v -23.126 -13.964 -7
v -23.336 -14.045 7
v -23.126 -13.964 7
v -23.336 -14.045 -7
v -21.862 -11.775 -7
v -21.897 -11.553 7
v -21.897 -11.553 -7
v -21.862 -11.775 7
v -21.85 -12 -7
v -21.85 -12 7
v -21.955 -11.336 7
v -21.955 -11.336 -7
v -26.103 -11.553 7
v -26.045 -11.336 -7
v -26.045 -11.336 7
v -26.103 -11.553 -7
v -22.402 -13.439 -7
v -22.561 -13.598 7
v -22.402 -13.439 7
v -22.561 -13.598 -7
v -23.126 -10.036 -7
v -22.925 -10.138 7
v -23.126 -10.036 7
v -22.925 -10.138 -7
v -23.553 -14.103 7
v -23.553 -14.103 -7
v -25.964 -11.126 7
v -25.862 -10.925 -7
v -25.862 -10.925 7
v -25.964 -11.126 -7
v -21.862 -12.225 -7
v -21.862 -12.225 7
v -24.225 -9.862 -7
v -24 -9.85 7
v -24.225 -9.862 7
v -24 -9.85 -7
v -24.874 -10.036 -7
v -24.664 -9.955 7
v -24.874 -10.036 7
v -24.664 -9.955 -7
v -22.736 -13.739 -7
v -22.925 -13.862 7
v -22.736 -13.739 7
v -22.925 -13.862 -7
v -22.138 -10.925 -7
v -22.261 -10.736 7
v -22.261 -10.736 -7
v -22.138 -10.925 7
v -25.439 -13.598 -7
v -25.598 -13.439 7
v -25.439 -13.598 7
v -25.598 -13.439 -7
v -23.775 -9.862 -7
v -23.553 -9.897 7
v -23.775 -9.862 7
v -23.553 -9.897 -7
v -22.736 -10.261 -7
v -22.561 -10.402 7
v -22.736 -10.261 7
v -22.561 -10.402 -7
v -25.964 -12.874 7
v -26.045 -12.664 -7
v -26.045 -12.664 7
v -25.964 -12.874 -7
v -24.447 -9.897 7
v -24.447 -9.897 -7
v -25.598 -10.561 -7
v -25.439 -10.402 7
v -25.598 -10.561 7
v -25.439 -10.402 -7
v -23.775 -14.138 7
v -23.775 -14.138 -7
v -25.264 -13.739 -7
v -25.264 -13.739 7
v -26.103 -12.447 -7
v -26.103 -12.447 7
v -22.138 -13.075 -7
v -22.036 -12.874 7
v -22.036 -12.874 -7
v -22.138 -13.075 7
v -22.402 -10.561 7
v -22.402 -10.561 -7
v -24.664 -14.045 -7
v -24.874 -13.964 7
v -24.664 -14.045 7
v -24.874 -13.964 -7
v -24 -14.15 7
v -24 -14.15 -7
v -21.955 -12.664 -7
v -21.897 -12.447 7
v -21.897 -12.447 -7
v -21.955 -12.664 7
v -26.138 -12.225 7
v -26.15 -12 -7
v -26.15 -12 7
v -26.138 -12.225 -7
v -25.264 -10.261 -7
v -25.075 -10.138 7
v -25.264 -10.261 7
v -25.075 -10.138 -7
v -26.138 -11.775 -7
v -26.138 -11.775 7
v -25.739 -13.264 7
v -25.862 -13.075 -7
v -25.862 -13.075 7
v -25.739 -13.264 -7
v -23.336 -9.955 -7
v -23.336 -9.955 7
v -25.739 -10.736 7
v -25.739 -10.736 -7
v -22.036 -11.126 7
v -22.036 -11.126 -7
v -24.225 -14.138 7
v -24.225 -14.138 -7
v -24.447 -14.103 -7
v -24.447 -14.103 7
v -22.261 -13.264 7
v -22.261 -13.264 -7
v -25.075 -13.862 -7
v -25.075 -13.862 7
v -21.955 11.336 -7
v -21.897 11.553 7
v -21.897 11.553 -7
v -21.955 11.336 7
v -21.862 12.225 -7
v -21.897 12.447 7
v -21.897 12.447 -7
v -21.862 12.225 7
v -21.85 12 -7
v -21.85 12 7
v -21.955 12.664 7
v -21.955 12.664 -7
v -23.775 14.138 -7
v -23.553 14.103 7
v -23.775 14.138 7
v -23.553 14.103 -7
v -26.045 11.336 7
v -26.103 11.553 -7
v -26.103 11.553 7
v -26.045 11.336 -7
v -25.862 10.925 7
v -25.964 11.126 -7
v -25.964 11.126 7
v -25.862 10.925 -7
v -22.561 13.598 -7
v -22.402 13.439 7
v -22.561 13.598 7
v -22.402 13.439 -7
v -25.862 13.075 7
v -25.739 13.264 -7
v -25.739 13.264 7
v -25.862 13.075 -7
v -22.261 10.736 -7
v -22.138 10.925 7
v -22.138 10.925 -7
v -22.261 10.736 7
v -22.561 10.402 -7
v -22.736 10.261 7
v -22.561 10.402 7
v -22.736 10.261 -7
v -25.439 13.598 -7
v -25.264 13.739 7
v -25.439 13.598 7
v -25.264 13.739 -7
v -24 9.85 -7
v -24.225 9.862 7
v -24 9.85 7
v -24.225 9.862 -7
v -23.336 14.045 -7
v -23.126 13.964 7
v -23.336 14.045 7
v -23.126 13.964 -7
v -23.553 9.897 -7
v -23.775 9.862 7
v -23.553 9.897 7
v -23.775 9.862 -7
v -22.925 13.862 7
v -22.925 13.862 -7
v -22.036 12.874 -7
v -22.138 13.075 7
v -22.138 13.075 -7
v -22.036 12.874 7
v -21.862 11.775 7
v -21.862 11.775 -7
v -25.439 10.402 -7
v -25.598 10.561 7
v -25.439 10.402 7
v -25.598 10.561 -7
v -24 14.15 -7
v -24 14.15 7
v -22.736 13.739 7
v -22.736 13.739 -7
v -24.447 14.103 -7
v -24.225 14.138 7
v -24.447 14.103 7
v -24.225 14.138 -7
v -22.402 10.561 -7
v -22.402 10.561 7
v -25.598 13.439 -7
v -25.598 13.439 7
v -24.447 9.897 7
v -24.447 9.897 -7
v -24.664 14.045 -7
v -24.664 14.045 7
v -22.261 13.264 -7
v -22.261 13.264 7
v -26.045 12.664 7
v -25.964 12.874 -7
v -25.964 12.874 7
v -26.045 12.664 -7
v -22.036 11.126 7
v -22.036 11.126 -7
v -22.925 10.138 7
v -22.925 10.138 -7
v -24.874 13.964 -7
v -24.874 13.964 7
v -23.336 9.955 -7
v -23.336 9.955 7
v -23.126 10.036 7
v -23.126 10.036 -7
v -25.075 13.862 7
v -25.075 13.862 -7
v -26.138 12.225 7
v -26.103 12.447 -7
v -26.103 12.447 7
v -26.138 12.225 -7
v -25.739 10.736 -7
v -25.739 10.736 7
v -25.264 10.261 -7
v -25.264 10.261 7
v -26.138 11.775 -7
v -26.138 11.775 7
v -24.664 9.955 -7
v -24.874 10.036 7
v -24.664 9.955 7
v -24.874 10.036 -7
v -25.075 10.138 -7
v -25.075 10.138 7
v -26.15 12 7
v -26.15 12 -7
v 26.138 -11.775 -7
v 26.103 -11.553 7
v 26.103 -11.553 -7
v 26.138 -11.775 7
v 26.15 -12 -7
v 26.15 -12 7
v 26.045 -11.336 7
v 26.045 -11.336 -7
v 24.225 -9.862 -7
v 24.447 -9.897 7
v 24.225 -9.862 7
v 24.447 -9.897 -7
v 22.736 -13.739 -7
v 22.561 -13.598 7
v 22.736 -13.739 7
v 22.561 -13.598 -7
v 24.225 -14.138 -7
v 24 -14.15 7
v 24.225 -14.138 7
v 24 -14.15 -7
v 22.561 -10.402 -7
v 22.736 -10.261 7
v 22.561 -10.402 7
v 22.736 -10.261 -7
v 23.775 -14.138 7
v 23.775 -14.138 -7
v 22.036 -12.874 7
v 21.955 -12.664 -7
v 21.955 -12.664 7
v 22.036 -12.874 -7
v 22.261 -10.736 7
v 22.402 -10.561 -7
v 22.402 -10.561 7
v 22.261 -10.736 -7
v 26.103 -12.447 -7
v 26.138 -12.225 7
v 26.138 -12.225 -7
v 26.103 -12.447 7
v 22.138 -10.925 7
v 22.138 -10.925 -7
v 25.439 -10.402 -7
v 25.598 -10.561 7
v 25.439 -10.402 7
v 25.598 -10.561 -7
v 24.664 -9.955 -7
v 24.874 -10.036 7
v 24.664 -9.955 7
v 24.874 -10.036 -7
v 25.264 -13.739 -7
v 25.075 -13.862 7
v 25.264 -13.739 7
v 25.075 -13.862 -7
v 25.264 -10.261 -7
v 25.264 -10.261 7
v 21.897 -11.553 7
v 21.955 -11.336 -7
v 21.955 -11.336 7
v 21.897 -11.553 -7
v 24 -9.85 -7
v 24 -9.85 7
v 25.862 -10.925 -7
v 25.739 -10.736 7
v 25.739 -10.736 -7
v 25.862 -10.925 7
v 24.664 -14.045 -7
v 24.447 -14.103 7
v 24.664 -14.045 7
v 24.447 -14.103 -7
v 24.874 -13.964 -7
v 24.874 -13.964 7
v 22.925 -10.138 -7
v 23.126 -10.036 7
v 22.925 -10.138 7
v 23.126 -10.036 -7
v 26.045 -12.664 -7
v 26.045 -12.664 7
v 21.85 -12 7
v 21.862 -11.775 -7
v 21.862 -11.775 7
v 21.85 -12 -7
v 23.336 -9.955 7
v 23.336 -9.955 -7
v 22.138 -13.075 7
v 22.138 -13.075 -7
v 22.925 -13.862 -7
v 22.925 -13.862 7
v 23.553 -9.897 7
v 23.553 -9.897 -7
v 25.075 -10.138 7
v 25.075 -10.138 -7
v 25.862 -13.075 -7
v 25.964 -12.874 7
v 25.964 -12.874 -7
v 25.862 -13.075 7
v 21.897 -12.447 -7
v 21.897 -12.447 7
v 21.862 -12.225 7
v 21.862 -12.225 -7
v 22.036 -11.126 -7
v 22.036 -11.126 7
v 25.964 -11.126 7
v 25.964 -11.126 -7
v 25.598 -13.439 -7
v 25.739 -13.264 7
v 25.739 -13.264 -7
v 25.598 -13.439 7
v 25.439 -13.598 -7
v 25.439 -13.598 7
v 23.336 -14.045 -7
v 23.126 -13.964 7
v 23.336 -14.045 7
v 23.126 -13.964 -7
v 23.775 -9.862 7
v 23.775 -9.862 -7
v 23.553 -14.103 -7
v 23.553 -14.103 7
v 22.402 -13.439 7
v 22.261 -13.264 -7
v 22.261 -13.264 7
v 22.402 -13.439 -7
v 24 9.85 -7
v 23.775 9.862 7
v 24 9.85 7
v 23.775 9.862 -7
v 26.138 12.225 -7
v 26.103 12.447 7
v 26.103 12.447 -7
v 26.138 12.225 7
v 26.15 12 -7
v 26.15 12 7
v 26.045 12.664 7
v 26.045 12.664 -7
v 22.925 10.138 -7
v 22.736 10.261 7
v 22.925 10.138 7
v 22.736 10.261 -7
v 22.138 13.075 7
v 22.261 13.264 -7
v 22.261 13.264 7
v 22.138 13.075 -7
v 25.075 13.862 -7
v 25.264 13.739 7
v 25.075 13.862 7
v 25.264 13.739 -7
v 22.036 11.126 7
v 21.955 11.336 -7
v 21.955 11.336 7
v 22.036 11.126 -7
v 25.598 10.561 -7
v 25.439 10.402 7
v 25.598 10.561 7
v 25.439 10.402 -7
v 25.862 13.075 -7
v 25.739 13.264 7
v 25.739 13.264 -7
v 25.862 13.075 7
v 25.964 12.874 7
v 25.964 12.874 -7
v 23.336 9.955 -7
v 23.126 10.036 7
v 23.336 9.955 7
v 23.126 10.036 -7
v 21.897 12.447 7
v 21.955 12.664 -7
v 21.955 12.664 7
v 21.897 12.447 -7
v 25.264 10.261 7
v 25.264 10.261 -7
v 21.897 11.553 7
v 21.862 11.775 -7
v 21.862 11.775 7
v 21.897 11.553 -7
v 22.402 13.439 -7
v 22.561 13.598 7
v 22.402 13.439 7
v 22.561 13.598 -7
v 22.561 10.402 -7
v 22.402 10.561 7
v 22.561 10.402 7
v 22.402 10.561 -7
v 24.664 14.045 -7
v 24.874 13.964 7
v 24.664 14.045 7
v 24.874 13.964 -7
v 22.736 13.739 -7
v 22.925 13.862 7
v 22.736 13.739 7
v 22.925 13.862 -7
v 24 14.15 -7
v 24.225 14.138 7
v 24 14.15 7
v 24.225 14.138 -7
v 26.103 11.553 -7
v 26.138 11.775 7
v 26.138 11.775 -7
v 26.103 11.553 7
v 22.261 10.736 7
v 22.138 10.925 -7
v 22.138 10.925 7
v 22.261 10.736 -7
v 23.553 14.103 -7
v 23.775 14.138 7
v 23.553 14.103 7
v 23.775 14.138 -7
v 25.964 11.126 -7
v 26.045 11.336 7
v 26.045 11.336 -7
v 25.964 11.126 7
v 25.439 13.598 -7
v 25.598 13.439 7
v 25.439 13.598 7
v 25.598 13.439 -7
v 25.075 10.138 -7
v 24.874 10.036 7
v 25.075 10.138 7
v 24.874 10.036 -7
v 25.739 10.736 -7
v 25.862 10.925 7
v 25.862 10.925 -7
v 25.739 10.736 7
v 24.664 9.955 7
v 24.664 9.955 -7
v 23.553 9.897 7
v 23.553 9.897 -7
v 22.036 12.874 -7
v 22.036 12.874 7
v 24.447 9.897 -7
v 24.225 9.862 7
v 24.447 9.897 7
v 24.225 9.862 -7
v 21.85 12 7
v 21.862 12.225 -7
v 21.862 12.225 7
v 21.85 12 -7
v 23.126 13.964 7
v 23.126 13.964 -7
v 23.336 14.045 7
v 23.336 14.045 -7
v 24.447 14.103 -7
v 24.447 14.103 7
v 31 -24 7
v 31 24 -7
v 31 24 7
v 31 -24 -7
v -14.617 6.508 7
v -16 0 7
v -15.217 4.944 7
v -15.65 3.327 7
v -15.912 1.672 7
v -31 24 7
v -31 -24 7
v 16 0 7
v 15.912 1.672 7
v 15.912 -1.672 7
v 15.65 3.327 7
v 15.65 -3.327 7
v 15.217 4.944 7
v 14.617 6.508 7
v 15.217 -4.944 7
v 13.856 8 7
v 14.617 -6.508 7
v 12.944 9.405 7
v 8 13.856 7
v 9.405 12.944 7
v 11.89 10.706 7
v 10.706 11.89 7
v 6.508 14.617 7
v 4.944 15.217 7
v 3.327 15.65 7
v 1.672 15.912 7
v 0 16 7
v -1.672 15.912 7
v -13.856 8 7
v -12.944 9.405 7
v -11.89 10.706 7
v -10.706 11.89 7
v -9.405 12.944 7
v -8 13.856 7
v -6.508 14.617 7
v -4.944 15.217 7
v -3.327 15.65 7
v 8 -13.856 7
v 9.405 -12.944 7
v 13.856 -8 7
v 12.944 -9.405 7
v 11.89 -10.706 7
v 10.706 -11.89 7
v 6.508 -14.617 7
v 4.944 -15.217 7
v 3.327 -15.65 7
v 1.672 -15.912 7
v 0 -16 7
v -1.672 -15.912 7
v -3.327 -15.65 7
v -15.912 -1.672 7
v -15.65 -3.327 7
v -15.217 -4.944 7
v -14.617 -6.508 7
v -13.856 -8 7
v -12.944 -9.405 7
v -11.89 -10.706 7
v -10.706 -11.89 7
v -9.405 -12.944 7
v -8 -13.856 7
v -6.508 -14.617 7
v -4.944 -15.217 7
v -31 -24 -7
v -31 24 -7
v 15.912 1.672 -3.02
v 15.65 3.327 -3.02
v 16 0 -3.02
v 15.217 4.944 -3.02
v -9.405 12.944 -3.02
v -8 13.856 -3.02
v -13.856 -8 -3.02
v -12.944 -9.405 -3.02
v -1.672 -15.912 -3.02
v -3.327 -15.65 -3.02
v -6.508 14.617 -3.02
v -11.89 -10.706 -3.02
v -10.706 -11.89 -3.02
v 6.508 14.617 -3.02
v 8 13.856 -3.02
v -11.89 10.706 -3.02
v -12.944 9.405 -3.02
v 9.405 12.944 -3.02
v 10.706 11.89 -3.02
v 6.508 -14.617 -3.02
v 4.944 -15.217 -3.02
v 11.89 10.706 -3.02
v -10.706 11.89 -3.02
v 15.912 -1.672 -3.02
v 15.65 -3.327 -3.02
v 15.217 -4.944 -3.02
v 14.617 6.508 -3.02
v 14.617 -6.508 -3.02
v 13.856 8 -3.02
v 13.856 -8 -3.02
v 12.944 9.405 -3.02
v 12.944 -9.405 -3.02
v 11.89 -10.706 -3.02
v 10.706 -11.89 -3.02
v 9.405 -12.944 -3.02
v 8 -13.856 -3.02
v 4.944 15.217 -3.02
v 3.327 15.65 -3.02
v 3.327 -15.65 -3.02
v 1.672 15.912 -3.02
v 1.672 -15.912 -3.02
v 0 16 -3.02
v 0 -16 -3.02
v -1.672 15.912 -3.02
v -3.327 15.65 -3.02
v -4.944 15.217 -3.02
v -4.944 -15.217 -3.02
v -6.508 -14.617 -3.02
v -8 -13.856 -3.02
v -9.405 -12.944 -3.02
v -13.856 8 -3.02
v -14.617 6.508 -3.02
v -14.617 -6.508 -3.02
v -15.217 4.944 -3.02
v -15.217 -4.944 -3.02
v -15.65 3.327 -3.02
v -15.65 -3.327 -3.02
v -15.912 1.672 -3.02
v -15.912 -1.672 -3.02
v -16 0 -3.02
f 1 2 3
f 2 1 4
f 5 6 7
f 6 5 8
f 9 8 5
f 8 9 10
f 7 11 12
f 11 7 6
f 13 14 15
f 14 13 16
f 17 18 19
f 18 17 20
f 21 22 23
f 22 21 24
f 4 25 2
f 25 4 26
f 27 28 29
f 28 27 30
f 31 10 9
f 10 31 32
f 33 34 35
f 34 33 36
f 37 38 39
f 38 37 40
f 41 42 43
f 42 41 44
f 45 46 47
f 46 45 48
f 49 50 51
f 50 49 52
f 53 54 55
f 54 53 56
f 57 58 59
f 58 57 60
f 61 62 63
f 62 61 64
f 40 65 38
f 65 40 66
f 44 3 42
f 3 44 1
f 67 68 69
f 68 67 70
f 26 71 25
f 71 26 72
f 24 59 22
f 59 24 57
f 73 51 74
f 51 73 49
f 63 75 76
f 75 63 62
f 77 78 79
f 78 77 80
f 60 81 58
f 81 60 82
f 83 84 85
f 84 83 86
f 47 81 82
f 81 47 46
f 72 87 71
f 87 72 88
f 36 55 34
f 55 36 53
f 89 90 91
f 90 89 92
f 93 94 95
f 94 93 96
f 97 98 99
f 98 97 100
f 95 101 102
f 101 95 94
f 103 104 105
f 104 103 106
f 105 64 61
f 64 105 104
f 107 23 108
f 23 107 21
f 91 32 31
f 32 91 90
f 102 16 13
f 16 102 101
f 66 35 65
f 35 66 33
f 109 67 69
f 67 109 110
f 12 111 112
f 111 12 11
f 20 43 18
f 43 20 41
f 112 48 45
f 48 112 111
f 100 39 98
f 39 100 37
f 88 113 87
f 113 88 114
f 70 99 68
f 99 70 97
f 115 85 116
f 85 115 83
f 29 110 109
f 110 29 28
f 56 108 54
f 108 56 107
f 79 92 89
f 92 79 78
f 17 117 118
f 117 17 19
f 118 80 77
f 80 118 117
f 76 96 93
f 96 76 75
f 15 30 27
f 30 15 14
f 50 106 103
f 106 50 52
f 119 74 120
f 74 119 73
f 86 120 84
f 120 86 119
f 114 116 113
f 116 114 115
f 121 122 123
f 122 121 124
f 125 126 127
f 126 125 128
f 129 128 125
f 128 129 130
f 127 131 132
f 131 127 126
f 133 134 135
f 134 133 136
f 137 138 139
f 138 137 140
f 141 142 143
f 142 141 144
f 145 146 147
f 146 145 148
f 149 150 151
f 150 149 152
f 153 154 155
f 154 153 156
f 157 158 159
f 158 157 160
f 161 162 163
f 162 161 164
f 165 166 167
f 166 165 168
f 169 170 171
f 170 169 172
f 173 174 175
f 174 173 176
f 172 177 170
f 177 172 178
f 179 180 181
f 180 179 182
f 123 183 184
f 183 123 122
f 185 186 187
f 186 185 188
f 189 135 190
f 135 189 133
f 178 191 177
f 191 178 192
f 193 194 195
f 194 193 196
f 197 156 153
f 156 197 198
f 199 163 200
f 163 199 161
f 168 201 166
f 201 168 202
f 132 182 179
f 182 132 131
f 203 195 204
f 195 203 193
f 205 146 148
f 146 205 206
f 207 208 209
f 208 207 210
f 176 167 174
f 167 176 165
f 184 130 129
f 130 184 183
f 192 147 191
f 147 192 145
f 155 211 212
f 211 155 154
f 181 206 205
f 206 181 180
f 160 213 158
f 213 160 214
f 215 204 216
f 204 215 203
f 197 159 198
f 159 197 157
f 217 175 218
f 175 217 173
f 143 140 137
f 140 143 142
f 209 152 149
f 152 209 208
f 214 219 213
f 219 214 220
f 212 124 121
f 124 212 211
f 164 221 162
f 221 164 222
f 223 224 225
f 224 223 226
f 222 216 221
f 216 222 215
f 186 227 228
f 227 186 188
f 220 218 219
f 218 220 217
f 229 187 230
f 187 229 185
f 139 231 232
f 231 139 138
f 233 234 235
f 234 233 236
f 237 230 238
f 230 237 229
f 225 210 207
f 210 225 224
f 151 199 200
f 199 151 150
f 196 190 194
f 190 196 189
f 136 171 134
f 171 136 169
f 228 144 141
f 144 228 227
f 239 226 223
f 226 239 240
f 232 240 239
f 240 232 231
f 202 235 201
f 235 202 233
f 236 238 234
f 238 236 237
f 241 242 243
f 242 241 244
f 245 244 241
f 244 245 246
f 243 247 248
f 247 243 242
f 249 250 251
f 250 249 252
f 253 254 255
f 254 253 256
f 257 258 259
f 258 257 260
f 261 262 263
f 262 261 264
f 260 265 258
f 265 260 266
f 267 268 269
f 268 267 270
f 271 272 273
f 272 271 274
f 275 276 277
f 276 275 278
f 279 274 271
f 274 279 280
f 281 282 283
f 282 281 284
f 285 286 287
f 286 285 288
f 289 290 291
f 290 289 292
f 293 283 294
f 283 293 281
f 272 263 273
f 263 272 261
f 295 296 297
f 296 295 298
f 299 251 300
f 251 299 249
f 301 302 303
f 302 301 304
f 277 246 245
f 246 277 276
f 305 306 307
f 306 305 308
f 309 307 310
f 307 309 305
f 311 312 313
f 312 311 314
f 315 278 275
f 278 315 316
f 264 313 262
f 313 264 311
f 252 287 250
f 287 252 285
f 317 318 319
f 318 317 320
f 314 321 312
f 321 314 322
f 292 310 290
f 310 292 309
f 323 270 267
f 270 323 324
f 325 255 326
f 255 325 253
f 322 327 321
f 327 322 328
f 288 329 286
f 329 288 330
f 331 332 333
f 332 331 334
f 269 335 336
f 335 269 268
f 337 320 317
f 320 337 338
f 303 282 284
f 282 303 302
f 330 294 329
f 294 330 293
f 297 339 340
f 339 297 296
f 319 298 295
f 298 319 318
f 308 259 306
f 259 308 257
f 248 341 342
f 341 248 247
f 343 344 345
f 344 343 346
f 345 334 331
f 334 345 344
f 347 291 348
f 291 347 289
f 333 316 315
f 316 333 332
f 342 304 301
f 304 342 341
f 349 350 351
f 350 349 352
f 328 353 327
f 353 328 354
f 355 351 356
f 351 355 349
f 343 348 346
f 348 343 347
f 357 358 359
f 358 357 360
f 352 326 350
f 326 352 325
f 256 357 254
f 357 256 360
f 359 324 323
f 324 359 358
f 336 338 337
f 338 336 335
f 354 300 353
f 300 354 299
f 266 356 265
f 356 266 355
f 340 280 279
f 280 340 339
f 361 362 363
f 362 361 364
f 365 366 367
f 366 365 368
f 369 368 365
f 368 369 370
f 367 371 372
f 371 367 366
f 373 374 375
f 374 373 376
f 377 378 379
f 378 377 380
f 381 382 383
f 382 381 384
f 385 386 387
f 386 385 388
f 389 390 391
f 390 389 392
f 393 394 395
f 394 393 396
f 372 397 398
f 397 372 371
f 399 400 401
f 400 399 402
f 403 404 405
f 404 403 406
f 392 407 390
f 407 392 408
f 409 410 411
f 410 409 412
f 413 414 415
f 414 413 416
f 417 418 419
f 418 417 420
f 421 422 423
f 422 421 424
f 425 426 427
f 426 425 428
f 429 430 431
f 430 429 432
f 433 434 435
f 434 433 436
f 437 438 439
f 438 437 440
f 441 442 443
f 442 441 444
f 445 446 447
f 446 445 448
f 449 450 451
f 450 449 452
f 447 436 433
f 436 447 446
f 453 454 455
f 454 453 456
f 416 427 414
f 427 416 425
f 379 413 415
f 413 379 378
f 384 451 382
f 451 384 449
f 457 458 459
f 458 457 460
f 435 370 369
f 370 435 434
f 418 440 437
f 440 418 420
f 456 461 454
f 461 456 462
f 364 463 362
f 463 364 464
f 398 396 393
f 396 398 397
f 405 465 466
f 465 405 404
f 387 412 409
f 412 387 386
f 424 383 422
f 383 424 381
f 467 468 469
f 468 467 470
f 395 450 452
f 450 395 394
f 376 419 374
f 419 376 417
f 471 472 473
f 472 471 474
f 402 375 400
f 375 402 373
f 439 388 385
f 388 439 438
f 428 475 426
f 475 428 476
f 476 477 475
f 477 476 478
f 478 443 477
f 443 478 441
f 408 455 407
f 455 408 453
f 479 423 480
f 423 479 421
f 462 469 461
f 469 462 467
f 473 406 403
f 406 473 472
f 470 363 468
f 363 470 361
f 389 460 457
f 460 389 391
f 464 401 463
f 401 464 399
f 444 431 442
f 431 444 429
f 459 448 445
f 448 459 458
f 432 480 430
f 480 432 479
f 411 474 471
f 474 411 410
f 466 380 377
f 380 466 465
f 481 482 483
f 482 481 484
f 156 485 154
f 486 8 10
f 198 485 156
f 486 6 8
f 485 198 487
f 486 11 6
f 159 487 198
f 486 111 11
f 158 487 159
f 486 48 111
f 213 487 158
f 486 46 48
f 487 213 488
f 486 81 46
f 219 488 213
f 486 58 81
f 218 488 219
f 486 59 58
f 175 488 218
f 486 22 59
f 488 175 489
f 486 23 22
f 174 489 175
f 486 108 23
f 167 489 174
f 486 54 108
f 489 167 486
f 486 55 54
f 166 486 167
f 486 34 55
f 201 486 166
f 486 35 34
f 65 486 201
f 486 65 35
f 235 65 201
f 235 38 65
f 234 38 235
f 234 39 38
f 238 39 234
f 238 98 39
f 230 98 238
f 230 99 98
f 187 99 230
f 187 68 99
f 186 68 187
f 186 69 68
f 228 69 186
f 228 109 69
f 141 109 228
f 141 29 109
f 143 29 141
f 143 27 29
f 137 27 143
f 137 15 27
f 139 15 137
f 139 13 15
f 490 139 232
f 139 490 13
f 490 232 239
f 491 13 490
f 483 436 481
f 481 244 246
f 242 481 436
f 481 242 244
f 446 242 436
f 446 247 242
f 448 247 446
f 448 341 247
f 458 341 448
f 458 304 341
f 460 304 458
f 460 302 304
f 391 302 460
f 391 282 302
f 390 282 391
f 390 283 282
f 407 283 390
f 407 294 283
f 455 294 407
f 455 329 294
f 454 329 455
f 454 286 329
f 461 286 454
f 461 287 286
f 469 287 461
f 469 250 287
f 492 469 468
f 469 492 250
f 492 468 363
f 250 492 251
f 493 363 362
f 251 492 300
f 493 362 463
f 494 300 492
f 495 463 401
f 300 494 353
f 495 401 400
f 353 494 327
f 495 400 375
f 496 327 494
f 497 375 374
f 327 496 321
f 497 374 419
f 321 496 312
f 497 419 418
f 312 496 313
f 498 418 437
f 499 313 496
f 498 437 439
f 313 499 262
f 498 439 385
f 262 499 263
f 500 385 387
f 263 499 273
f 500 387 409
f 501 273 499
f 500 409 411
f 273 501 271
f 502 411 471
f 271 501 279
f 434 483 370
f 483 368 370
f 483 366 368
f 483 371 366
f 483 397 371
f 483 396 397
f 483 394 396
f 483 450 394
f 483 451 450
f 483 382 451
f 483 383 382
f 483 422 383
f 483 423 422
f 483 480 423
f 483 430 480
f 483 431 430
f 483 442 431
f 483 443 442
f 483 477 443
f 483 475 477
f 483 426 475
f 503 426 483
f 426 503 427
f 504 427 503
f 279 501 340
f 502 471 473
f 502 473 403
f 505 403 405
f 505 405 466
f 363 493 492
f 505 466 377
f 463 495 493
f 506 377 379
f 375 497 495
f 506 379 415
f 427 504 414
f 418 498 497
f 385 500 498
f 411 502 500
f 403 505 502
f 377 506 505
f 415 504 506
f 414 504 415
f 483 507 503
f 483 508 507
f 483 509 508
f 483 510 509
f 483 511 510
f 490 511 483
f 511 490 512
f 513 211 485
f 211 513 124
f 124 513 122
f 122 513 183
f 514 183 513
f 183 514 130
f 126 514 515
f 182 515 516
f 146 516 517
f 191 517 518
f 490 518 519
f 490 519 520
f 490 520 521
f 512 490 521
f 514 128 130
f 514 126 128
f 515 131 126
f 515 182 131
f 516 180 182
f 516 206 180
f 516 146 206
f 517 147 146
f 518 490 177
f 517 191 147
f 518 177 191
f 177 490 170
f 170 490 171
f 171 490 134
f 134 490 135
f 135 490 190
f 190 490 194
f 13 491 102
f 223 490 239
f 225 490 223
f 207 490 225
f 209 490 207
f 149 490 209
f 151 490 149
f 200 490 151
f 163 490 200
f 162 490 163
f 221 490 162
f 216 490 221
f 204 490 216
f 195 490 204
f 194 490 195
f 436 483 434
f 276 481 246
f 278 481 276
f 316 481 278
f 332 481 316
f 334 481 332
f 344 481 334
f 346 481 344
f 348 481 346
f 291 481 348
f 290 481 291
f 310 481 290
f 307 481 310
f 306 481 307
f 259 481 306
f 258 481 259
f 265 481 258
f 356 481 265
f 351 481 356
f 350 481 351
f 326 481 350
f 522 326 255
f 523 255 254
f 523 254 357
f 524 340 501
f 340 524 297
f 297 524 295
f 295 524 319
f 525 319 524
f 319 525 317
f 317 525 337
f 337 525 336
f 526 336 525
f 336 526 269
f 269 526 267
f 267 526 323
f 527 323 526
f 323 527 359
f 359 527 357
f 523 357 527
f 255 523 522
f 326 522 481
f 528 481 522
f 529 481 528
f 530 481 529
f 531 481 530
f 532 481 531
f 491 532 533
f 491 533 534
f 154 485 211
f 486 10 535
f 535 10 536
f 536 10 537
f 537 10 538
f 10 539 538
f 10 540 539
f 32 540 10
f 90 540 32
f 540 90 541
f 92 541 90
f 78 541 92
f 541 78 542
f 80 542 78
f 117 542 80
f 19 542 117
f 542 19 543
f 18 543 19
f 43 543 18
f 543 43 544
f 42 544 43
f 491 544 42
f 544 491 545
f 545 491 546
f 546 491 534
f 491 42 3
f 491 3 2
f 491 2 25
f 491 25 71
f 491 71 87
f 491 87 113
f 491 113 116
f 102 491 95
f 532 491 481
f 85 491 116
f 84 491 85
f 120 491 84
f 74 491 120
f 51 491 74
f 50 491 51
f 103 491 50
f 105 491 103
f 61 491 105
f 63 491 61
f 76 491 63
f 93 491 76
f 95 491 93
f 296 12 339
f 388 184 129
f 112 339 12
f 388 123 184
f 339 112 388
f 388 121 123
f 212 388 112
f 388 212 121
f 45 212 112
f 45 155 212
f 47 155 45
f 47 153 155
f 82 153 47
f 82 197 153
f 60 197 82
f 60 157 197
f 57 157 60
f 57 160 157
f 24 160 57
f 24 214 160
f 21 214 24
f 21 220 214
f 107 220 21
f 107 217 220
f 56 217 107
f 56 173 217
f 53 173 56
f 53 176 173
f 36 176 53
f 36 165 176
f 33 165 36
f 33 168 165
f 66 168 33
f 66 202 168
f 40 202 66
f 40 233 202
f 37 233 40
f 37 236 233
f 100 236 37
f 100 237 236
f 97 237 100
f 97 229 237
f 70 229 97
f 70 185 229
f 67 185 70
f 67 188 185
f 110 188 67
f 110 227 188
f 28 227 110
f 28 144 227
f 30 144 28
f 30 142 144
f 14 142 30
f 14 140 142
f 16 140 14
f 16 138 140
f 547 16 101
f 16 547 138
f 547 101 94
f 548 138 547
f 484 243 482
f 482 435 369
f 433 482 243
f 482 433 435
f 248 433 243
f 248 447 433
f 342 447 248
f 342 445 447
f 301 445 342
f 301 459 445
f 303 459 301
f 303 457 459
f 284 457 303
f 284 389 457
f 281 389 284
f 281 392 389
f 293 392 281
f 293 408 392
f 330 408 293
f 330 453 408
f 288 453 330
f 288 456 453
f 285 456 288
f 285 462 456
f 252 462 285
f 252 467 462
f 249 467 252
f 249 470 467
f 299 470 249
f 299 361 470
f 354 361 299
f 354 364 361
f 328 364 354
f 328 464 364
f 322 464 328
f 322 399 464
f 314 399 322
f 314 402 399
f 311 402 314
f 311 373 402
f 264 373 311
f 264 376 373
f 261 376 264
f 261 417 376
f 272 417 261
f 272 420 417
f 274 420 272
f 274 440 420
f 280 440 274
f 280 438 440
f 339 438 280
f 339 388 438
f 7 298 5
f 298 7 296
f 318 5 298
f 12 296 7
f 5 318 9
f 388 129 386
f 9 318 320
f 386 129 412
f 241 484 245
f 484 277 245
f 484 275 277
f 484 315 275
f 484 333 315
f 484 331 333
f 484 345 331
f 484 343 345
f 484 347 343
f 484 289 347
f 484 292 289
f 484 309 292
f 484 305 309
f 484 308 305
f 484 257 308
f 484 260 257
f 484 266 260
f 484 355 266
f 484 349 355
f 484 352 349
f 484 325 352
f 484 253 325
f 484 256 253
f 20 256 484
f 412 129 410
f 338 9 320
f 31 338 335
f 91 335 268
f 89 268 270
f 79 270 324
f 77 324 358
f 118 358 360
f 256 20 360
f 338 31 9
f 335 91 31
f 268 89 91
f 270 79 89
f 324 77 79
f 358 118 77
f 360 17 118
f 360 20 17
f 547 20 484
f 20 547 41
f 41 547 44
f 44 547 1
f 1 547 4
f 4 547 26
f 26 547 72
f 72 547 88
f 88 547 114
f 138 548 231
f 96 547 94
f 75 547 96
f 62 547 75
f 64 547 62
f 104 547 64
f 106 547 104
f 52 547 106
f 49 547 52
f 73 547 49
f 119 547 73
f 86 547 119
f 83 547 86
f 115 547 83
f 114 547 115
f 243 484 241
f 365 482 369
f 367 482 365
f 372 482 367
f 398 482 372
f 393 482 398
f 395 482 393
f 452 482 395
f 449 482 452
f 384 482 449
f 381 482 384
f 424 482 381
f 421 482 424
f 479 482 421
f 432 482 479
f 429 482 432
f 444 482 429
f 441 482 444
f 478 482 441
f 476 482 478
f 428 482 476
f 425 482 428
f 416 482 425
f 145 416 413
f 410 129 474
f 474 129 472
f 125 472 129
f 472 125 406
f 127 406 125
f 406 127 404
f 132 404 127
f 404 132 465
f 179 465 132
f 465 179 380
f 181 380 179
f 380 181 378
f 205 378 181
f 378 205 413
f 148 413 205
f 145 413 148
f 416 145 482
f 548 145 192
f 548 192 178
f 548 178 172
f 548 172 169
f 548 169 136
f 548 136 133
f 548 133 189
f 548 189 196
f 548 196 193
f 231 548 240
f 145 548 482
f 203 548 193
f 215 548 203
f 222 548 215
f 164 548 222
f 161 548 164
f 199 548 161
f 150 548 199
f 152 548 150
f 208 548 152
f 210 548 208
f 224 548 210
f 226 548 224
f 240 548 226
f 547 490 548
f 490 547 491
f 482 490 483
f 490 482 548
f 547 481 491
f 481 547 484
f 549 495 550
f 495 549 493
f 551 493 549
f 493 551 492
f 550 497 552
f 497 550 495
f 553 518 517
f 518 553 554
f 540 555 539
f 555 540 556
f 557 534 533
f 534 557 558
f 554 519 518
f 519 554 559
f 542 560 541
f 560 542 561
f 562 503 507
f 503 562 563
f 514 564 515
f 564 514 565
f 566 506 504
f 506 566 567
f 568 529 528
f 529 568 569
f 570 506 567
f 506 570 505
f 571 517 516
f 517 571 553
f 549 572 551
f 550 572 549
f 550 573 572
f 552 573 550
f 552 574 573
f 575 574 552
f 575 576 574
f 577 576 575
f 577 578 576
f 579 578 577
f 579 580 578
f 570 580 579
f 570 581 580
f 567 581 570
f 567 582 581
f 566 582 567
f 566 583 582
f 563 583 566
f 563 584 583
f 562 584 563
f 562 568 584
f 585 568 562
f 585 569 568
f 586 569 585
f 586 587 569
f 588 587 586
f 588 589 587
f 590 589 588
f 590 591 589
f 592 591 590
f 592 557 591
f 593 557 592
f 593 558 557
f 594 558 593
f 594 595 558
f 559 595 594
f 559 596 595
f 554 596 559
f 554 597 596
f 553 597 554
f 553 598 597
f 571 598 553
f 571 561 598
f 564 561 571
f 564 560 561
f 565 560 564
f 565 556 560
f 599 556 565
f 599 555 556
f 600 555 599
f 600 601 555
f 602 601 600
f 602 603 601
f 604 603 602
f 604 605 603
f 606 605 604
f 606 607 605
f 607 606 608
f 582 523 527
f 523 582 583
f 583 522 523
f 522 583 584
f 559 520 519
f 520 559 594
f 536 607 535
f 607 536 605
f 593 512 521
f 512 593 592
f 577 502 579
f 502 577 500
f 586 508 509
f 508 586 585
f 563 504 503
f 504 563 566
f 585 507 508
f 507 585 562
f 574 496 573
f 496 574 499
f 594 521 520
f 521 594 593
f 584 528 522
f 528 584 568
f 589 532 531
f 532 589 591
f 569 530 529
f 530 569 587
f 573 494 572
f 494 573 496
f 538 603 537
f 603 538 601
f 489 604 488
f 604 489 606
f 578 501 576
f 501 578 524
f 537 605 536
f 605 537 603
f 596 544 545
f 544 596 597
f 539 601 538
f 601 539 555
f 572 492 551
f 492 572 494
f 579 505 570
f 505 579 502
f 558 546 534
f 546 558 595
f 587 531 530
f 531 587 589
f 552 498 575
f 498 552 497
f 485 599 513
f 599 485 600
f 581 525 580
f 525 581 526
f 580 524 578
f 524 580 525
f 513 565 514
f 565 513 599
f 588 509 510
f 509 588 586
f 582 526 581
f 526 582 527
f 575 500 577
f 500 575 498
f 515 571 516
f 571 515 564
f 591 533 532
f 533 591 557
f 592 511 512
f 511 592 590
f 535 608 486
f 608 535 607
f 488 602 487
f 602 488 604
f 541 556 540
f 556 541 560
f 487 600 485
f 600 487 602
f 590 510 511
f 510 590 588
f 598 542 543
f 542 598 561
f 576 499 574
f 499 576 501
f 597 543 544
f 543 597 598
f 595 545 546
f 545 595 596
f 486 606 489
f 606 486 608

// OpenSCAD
// Lead-screw nut holder with 32 mm pocket.
$fn = 60;
eps = 0.02;
body_l = 62;
body_w = 48;
body_t = 14;
pocket_d = 32;
pocket_depth = 10;
mount_x = 24.0;
difference() {
    cube([body_l, body_w, body_t], center = true);
    translate([0, 0, body_t / 2 - pocket_depth - eps]) cylinder(d = pocket_d, h = pocket_depth + 2 * eps);
    for (x = [-mount_x, mount_x], y = [-body_w / 4, body_w / 4])
        translate([x, y, -body_t / 2 - eps]) cylinder(d = 4.3, h = body_t + 2 * eps);
}
